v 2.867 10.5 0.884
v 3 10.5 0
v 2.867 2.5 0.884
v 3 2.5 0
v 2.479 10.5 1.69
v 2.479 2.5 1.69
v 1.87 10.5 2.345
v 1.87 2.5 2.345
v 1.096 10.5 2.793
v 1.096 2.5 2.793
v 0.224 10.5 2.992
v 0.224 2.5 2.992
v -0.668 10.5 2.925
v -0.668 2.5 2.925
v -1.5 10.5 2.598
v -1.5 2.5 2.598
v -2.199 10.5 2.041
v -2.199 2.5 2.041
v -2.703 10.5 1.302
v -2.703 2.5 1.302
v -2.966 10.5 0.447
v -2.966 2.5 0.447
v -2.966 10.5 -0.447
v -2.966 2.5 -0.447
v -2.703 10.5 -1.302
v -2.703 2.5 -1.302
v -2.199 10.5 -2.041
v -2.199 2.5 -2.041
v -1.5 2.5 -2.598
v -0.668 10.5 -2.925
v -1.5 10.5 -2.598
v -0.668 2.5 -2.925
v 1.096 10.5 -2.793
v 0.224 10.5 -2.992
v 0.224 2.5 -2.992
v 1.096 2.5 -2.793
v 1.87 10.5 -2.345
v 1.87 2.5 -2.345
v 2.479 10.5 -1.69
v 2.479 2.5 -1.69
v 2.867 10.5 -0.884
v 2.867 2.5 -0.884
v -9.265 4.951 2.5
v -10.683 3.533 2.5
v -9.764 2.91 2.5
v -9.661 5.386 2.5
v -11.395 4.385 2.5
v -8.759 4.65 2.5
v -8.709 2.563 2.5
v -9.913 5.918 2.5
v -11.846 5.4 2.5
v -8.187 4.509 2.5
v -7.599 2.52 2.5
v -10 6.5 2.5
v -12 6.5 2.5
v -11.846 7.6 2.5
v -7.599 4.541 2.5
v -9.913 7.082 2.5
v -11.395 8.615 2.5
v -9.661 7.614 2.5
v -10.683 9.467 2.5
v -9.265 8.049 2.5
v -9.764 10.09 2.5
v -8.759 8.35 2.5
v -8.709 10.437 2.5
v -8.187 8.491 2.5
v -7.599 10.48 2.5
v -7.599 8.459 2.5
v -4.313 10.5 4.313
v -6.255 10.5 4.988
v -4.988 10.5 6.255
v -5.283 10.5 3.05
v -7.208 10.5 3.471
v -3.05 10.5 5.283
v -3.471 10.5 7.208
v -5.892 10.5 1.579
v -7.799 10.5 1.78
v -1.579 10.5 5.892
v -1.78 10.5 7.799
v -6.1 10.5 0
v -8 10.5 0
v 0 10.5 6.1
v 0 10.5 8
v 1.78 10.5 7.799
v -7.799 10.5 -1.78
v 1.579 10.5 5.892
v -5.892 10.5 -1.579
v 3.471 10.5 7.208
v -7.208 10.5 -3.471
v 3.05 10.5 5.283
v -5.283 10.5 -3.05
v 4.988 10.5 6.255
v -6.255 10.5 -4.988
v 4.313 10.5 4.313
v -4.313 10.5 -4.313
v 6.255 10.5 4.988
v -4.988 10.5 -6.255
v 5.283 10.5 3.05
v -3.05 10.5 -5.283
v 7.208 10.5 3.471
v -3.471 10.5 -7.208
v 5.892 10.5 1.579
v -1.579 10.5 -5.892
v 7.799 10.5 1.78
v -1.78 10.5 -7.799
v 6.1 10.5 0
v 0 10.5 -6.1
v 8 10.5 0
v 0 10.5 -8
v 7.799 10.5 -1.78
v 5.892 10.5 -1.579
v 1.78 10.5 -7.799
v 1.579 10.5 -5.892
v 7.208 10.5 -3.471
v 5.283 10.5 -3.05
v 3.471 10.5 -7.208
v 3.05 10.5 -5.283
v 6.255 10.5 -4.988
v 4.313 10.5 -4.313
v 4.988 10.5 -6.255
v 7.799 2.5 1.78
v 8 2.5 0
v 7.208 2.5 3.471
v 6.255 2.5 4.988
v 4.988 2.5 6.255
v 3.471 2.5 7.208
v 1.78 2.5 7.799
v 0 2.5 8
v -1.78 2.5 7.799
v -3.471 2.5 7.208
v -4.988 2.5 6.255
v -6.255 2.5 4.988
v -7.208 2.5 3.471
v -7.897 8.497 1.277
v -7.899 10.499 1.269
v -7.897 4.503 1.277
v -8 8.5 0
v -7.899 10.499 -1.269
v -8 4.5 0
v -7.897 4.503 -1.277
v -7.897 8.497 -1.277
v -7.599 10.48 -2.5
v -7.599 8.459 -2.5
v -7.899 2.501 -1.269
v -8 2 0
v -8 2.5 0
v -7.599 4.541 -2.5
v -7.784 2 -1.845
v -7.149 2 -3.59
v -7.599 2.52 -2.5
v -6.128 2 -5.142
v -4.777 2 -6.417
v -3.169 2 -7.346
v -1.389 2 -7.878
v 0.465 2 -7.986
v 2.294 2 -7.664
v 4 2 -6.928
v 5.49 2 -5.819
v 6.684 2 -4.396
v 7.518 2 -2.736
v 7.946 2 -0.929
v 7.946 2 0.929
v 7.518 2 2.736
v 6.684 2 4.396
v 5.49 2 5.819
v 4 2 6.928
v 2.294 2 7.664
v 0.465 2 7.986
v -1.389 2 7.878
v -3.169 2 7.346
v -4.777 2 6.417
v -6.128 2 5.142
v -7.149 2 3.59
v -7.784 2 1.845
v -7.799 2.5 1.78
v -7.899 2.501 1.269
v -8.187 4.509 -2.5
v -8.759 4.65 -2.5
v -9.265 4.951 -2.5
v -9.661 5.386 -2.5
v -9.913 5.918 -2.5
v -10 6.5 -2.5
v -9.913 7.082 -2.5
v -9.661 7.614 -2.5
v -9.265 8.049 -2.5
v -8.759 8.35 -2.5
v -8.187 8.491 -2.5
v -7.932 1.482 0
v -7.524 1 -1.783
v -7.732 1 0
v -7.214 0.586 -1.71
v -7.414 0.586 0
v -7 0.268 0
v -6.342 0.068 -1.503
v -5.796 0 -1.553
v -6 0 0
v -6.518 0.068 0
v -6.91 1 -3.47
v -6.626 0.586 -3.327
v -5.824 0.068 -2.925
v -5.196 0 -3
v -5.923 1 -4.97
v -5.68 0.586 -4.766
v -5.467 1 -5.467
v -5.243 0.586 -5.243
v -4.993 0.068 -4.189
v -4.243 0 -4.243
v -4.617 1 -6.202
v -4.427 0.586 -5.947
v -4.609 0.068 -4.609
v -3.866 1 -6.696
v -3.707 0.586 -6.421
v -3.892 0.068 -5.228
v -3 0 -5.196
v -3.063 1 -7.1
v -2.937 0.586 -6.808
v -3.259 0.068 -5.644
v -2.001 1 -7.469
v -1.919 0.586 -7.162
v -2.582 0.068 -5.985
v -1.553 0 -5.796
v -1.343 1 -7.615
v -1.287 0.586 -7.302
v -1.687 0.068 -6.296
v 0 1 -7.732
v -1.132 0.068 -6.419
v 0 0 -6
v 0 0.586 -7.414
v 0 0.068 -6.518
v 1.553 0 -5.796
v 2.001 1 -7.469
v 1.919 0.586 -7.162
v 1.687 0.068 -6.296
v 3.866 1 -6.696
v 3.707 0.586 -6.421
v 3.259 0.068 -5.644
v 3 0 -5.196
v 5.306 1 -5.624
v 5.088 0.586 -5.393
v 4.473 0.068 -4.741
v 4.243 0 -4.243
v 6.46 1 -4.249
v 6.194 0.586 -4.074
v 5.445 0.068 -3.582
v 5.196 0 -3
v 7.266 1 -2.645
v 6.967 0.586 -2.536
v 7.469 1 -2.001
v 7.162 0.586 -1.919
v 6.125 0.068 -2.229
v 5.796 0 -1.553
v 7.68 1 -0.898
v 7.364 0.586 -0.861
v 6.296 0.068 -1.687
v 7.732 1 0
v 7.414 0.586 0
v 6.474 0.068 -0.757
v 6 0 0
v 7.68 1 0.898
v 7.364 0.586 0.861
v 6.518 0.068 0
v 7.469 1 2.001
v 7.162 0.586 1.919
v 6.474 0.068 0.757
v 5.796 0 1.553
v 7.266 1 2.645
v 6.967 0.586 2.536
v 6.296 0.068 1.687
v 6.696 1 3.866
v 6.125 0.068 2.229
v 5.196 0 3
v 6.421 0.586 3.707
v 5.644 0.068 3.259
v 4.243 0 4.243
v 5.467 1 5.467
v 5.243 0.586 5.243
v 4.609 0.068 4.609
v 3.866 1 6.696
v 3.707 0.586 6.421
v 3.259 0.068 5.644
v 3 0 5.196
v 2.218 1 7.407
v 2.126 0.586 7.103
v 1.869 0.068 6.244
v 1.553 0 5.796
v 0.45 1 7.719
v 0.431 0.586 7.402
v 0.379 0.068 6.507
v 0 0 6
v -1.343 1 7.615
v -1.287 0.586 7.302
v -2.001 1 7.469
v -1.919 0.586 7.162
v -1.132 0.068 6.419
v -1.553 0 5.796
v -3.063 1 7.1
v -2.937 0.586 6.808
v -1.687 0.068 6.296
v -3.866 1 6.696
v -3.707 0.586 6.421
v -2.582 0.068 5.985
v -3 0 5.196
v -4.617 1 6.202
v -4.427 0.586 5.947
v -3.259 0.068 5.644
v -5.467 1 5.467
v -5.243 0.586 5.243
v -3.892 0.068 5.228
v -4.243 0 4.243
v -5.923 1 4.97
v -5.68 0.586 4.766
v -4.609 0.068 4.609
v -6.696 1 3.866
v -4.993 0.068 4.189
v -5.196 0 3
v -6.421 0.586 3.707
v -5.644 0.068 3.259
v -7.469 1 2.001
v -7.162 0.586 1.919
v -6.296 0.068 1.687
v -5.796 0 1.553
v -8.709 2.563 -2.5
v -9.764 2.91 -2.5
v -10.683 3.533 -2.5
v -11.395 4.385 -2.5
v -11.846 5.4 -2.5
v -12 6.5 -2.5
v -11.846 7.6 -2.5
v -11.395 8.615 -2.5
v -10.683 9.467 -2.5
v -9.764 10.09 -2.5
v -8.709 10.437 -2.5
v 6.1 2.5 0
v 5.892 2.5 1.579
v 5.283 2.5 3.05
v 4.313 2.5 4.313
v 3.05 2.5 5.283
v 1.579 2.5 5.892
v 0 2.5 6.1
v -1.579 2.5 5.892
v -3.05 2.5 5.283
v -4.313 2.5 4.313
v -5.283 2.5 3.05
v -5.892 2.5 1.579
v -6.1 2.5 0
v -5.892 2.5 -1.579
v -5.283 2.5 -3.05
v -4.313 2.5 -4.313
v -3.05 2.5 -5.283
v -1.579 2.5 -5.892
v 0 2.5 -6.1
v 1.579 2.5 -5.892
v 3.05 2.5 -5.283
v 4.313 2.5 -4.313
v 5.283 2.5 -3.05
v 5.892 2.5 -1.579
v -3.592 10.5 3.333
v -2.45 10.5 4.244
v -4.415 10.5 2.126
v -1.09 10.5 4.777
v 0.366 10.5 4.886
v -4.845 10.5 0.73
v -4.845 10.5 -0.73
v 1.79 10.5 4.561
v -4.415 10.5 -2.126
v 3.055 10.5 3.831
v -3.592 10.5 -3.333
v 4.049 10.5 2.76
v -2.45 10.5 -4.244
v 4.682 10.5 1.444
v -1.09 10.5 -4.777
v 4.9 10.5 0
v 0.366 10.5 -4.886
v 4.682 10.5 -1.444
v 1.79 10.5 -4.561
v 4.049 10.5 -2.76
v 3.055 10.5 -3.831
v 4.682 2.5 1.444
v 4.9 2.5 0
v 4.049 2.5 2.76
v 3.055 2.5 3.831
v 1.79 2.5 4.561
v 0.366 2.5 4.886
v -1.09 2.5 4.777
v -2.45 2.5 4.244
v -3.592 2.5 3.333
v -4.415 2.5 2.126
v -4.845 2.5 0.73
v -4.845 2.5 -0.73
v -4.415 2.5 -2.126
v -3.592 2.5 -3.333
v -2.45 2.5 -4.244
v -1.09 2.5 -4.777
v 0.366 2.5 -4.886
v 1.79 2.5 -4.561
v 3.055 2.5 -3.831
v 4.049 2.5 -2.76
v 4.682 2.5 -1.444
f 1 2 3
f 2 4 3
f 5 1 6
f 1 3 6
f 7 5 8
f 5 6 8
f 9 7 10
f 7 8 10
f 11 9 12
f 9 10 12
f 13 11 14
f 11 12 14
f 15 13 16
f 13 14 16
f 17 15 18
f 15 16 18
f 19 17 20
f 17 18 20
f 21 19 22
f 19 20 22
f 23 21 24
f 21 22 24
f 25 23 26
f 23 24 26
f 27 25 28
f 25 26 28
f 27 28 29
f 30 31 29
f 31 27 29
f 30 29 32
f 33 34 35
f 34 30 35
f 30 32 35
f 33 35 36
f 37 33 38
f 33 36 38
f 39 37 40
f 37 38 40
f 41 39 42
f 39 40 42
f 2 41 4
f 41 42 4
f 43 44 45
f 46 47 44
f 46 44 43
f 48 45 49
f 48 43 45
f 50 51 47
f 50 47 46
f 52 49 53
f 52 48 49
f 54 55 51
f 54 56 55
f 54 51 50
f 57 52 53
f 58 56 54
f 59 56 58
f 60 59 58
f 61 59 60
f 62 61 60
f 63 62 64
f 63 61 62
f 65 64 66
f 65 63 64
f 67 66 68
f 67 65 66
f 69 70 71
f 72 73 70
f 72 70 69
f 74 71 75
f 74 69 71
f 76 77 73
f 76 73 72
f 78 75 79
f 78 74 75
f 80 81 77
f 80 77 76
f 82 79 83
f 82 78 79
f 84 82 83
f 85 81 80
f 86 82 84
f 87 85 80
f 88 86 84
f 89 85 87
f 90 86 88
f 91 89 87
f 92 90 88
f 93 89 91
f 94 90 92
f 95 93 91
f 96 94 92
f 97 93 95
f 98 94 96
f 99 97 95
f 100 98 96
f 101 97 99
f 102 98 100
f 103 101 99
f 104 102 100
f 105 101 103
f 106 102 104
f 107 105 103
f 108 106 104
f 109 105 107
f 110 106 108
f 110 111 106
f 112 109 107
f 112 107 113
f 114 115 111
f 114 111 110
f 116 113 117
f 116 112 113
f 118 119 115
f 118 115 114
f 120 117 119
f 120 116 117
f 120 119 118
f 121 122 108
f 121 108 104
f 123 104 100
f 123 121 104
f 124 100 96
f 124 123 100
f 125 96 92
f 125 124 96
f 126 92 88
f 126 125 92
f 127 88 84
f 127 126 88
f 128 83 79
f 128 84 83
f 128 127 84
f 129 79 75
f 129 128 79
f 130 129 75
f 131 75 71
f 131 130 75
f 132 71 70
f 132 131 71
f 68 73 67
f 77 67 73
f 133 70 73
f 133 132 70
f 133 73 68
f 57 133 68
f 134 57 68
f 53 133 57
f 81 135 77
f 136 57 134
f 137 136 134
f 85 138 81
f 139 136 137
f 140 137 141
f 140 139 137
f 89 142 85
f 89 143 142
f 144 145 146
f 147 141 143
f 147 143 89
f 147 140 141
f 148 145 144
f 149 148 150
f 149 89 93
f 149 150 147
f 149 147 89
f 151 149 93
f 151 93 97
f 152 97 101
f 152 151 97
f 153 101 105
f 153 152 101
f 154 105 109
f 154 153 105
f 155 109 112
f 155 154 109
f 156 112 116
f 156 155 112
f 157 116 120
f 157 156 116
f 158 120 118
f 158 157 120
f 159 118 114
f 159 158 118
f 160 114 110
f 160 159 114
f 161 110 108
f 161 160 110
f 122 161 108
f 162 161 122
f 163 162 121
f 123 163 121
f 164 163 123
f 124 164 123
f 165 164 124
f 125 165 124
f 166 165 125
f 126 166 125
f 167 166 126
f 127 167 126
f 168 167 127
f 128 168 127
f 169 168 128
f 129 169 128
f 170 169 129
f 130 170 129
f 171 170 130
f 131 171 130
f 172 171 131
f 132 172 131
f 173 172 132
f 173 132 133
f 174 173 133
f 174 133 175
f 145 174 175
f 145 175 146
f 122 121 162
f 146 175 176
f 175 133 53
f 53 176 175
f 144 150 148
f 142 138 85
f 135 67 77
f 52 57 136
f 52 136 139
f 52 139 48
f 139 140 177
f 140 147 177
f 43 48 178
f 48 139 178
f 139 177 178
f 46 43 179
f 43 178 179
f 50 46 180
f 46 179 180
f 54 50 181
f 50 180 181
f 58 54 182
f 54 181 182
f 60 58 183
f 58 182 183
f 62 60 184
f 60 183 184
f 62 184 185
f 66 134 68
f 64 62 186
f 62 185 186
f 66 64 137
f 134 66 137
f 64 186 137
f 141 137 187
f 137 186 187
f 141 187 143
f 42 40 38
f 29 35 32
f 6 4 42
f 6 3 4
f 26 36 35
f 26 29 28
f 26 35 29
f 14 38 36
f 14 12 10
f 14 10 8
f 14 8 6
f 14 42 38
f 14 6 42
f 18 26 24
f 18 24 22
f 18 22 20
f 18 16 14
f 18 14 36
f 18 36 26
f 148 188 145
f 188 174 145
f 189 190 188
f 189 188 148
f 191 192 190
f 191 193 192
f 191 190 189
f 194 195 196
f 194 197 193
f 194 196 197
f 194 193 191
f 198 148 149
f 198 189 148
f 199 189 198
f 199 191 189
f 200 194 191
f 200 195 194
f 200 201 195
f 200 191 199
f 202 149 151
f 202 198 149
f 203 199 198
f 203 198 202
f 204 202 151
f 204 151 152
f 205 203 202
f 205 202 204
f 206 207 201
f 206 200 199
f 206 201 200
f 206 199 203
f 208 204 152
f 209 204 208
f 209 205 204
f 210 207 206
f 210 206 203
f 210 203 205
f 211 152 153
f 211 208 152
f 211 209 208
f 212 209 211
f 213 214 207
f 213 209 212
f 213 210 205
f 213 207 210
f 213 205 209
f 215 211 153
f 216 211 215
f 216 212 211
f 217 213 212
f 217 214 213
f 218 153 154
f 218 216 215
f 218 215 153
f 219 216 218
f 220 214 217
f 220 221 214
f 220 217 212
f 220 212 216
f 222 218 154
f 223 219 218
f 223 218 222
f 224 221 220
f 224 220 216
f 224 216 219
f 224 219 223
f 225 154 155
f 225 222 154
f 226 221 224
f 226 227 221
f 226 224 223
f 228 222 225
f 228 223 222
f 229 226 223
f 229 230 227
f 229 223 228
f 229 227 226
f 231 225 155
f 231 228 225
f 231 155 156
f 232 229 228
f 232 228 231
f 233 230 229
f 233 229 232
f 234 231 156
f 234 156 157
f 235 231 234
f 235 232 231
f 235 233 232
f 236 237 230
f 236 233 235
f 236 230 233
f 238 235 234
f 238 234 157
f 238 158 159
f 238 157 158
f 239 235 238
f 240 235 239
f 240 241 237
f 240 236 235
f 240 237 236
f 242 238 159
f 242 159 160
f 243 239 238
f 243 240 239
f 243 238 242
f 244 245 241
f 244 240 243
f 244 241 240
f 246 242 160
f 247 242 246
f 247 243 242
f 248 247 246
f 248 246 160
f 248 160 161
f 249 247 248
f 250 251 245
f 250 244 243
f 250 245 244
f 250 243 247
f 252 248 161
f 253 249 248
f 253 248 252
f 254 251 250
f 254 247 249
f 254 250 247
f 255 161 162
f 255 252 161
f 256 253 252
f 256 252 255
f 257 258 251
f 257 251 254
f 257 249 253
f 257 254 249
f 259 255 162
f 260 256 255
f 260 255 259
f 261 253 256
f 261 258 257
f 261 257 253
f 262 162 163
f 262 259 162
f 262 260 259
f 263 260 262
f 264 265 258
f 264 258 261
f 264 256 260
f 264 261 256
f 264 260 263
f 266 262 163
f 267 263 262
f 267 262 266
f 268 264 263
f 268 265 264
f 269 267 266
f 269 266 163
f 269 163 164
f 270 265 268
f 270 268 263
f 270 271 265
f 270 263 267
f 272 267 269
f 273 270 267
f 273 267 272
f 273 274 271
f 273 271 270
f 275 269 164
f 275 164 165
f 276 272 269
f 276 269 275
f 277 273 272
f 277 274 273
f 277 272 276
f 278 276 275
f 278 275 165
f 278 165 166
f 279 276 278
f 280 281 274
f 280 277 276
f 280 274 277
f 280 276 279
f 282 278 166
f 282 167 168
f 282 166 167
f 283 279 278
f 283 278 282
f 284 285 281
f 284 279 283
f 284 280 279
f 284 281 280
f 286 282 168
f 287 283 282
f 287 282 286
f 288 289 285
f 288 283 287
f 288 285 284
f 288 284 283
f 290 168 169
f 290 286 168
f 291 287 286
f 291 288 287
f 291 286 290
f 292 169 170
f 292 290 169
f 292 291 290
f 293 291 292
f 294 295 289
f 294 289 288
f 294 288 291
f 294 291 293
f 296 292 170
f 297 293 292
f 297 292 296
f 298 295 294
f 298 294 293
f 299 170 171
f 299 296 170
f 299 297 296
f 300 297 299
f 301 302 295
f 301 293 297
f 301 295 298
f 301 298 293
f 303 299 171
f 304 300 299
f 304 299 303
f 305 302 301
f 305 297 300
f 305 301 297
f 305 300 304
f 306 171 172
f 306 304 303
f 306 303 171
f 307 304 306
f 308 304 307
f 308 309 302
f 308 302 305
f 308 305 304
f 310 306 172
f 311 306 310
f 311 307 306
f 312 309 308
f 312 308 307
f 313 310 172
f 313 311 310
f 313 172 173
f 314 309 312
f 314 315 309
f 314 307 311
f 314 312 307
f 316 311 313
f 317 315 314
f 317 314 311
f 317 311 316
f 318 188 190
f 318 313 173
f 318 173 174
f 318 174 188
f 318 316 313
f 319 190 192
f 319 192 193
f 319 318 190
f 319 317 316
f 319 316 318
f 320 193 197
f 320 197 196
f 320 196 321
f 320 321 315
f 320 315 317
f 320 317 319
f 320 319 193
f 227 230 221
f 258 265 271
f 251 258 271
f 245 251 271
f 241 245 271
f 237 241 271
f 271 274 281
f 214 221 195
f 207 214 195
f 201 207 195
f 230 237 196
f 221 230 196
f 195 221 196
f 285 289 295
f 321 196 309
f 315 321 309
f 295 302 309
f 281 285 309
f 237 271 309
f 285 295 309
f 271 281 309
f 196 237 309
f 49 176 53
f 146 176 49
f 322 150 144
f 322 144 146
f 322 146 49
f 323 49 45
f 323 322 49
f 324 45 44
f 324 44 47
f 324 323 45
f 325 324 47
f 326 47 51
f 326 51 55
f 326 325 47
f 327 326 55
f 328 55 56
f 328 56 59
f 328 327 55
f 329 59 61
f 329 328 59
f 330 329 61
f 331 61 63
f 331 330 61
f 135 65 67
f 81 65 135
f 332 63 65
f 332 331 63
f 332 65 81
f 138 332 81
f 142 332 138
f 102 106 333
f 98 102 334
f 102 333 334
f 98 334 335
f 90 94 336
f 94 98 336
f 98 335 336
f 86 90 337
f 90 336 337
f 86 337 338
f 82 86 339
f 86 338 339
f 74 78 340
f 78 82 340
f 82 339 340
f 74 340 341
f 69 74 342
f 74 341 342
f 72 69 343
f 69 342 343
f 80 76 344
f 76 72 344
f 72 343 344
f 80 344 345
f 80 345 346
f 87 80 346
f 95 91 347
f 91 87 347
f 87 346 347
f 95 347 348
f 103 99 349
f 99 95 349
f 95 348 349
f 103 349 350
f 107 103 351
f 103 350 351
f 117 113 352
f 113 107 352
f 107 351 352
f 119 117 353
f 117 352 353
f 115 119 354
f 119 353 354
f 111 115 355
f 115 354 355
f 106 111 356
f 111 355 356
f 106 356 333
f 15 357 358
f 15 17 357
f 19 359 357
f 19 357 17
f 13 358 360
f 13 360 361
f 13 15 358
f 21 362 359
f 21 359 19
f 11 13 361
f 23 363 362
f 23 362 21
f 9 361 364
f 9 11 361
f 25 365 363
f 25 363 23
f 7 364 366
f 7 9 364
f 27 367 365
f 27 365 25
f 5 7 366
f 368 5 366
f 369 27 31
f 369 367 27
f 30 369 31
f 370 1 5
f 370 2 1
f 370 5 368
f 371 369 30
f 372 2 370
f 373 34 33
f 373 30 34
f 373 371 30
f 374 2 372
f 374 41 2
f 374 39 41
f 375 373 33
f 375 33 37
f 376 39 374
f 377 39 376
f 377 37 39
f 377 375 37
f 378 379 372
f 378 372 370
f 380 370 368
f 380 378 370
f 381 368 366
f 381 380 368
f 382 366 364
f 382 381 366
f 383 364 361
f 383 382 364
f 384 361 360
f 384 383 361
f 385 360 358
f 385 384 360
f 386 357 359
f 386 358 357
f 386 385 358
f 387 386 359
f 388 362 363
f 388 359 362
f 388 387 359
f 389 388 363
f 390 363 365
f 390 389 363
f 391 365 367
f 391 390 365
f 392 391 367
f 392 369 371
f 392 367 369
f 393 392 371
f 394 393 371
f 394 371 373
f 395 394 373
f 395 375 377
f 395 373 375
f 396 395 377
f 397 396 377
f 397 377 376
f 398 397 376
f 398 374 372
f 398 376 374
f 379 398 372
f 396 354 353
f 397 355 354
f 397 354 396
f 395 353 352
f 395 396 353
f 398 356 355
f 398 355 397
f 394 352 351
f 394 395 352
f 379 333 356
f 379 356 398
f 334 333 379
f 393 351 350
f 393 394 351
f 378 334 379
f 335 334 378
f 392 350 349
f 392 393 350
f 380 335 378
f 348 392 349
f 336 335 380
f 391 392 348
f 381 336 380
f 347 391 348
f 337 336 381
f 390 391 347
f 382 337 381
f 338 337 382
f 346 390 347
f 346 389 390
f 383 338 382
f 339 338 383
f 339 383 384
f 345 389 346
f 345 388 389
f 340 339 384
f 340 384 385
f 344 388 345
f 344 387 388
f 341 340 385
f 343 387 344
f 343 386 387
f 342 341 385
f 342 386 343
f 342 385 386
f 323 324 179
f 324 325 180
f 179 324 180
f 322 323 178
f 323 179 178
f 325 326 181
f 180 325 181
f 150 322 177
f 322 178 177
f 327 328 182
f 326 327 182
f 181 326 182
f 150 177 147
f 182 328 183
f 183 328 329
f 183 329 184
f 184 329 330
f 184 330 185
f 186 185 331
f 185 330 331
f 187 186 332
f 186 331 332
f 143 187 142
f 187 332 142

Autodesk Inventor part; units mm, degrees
ref_plane "YZ Plane" through (0, 0, 0) normal (1, 0, 0) x (0, 1, 0)
ref_plane "XZ Plane" through (0, 0, 0) normal (0, 1, 0) x (-1, 0, 0)
ref_plane "XY Plane" through (0, 0, 0) normal (0, 0, 1) x (1, 0, 0)
sketch "Sketch1" plane through (0, 0, 0) normal (0, 1, 0) x (-1, 0, 0)
  circle A0 centre (0, 0) radius 8
  dimension "d0" = 16
extrude "Extrusion1" add sketch "Sketch1" along normal blind 2.5
sketch "Sketch2" plane through (0, 2.5, 0) normal (0, 1, 0) x (1, 0, 0)
  circle A0 centre (0, 0) radius 4.9
  circle A1 centre (0, 0) radius 6.1
  circle A2 centre (0, 0) radius 8 projected
  circle A3 centre (0, 0) radius 3
  dimension "d3" = 9.8
  dimension "d4" = 12.2
  dimension "d8" = 6
extrude "Extrusion2" add sketch "Sketch2" along normal blind 8
fillet "Fillet1" radius 2 1 edges at (8, 0, 0)
sketch "Sketch3" plane through (0, 0, 0) normal (0, 0, 1) x (1, 0, 0)
  line L0 (-6.1, 10.5) -> (6.1, 10.5) projected
  line L1 (6.1, 2.5) -> (-6.1, 2.5) projected
  line L2 (6.1, 2.5) -> (-6.1, 2.5) projected
  line L3 (-8, 2) -> (-8, 10.5) projected
  circle A0 centre (-8, 6.5) radius 2
  circle A1 centre (-8, 6.5) radius 4
  line L4 (8, 10.5) -> (-8, 10.5) projected
  line L5 (-6.1, 10.5) -> (-6.1, 2.5) projected
  point P0 (0, 0)
  point P1 (-6.1, 7.1245)
  point P2 (-6.1, 10.0199)
  point P3 (-6.1, 2.9801)
  point P4 (-6.1, 5.8755)
  dimension "d14" = 4
  dimension "d15" = 2
  dimension "d16" = 4
extrude "Extrusion3" add sketch "Sketch3" along normal mid plane 5 contours A1 L3 A0 | L3 A0 L5 A1 | A1 L5 A0 L3
properties part number "Landing_leg_clamp_large_shoe"
